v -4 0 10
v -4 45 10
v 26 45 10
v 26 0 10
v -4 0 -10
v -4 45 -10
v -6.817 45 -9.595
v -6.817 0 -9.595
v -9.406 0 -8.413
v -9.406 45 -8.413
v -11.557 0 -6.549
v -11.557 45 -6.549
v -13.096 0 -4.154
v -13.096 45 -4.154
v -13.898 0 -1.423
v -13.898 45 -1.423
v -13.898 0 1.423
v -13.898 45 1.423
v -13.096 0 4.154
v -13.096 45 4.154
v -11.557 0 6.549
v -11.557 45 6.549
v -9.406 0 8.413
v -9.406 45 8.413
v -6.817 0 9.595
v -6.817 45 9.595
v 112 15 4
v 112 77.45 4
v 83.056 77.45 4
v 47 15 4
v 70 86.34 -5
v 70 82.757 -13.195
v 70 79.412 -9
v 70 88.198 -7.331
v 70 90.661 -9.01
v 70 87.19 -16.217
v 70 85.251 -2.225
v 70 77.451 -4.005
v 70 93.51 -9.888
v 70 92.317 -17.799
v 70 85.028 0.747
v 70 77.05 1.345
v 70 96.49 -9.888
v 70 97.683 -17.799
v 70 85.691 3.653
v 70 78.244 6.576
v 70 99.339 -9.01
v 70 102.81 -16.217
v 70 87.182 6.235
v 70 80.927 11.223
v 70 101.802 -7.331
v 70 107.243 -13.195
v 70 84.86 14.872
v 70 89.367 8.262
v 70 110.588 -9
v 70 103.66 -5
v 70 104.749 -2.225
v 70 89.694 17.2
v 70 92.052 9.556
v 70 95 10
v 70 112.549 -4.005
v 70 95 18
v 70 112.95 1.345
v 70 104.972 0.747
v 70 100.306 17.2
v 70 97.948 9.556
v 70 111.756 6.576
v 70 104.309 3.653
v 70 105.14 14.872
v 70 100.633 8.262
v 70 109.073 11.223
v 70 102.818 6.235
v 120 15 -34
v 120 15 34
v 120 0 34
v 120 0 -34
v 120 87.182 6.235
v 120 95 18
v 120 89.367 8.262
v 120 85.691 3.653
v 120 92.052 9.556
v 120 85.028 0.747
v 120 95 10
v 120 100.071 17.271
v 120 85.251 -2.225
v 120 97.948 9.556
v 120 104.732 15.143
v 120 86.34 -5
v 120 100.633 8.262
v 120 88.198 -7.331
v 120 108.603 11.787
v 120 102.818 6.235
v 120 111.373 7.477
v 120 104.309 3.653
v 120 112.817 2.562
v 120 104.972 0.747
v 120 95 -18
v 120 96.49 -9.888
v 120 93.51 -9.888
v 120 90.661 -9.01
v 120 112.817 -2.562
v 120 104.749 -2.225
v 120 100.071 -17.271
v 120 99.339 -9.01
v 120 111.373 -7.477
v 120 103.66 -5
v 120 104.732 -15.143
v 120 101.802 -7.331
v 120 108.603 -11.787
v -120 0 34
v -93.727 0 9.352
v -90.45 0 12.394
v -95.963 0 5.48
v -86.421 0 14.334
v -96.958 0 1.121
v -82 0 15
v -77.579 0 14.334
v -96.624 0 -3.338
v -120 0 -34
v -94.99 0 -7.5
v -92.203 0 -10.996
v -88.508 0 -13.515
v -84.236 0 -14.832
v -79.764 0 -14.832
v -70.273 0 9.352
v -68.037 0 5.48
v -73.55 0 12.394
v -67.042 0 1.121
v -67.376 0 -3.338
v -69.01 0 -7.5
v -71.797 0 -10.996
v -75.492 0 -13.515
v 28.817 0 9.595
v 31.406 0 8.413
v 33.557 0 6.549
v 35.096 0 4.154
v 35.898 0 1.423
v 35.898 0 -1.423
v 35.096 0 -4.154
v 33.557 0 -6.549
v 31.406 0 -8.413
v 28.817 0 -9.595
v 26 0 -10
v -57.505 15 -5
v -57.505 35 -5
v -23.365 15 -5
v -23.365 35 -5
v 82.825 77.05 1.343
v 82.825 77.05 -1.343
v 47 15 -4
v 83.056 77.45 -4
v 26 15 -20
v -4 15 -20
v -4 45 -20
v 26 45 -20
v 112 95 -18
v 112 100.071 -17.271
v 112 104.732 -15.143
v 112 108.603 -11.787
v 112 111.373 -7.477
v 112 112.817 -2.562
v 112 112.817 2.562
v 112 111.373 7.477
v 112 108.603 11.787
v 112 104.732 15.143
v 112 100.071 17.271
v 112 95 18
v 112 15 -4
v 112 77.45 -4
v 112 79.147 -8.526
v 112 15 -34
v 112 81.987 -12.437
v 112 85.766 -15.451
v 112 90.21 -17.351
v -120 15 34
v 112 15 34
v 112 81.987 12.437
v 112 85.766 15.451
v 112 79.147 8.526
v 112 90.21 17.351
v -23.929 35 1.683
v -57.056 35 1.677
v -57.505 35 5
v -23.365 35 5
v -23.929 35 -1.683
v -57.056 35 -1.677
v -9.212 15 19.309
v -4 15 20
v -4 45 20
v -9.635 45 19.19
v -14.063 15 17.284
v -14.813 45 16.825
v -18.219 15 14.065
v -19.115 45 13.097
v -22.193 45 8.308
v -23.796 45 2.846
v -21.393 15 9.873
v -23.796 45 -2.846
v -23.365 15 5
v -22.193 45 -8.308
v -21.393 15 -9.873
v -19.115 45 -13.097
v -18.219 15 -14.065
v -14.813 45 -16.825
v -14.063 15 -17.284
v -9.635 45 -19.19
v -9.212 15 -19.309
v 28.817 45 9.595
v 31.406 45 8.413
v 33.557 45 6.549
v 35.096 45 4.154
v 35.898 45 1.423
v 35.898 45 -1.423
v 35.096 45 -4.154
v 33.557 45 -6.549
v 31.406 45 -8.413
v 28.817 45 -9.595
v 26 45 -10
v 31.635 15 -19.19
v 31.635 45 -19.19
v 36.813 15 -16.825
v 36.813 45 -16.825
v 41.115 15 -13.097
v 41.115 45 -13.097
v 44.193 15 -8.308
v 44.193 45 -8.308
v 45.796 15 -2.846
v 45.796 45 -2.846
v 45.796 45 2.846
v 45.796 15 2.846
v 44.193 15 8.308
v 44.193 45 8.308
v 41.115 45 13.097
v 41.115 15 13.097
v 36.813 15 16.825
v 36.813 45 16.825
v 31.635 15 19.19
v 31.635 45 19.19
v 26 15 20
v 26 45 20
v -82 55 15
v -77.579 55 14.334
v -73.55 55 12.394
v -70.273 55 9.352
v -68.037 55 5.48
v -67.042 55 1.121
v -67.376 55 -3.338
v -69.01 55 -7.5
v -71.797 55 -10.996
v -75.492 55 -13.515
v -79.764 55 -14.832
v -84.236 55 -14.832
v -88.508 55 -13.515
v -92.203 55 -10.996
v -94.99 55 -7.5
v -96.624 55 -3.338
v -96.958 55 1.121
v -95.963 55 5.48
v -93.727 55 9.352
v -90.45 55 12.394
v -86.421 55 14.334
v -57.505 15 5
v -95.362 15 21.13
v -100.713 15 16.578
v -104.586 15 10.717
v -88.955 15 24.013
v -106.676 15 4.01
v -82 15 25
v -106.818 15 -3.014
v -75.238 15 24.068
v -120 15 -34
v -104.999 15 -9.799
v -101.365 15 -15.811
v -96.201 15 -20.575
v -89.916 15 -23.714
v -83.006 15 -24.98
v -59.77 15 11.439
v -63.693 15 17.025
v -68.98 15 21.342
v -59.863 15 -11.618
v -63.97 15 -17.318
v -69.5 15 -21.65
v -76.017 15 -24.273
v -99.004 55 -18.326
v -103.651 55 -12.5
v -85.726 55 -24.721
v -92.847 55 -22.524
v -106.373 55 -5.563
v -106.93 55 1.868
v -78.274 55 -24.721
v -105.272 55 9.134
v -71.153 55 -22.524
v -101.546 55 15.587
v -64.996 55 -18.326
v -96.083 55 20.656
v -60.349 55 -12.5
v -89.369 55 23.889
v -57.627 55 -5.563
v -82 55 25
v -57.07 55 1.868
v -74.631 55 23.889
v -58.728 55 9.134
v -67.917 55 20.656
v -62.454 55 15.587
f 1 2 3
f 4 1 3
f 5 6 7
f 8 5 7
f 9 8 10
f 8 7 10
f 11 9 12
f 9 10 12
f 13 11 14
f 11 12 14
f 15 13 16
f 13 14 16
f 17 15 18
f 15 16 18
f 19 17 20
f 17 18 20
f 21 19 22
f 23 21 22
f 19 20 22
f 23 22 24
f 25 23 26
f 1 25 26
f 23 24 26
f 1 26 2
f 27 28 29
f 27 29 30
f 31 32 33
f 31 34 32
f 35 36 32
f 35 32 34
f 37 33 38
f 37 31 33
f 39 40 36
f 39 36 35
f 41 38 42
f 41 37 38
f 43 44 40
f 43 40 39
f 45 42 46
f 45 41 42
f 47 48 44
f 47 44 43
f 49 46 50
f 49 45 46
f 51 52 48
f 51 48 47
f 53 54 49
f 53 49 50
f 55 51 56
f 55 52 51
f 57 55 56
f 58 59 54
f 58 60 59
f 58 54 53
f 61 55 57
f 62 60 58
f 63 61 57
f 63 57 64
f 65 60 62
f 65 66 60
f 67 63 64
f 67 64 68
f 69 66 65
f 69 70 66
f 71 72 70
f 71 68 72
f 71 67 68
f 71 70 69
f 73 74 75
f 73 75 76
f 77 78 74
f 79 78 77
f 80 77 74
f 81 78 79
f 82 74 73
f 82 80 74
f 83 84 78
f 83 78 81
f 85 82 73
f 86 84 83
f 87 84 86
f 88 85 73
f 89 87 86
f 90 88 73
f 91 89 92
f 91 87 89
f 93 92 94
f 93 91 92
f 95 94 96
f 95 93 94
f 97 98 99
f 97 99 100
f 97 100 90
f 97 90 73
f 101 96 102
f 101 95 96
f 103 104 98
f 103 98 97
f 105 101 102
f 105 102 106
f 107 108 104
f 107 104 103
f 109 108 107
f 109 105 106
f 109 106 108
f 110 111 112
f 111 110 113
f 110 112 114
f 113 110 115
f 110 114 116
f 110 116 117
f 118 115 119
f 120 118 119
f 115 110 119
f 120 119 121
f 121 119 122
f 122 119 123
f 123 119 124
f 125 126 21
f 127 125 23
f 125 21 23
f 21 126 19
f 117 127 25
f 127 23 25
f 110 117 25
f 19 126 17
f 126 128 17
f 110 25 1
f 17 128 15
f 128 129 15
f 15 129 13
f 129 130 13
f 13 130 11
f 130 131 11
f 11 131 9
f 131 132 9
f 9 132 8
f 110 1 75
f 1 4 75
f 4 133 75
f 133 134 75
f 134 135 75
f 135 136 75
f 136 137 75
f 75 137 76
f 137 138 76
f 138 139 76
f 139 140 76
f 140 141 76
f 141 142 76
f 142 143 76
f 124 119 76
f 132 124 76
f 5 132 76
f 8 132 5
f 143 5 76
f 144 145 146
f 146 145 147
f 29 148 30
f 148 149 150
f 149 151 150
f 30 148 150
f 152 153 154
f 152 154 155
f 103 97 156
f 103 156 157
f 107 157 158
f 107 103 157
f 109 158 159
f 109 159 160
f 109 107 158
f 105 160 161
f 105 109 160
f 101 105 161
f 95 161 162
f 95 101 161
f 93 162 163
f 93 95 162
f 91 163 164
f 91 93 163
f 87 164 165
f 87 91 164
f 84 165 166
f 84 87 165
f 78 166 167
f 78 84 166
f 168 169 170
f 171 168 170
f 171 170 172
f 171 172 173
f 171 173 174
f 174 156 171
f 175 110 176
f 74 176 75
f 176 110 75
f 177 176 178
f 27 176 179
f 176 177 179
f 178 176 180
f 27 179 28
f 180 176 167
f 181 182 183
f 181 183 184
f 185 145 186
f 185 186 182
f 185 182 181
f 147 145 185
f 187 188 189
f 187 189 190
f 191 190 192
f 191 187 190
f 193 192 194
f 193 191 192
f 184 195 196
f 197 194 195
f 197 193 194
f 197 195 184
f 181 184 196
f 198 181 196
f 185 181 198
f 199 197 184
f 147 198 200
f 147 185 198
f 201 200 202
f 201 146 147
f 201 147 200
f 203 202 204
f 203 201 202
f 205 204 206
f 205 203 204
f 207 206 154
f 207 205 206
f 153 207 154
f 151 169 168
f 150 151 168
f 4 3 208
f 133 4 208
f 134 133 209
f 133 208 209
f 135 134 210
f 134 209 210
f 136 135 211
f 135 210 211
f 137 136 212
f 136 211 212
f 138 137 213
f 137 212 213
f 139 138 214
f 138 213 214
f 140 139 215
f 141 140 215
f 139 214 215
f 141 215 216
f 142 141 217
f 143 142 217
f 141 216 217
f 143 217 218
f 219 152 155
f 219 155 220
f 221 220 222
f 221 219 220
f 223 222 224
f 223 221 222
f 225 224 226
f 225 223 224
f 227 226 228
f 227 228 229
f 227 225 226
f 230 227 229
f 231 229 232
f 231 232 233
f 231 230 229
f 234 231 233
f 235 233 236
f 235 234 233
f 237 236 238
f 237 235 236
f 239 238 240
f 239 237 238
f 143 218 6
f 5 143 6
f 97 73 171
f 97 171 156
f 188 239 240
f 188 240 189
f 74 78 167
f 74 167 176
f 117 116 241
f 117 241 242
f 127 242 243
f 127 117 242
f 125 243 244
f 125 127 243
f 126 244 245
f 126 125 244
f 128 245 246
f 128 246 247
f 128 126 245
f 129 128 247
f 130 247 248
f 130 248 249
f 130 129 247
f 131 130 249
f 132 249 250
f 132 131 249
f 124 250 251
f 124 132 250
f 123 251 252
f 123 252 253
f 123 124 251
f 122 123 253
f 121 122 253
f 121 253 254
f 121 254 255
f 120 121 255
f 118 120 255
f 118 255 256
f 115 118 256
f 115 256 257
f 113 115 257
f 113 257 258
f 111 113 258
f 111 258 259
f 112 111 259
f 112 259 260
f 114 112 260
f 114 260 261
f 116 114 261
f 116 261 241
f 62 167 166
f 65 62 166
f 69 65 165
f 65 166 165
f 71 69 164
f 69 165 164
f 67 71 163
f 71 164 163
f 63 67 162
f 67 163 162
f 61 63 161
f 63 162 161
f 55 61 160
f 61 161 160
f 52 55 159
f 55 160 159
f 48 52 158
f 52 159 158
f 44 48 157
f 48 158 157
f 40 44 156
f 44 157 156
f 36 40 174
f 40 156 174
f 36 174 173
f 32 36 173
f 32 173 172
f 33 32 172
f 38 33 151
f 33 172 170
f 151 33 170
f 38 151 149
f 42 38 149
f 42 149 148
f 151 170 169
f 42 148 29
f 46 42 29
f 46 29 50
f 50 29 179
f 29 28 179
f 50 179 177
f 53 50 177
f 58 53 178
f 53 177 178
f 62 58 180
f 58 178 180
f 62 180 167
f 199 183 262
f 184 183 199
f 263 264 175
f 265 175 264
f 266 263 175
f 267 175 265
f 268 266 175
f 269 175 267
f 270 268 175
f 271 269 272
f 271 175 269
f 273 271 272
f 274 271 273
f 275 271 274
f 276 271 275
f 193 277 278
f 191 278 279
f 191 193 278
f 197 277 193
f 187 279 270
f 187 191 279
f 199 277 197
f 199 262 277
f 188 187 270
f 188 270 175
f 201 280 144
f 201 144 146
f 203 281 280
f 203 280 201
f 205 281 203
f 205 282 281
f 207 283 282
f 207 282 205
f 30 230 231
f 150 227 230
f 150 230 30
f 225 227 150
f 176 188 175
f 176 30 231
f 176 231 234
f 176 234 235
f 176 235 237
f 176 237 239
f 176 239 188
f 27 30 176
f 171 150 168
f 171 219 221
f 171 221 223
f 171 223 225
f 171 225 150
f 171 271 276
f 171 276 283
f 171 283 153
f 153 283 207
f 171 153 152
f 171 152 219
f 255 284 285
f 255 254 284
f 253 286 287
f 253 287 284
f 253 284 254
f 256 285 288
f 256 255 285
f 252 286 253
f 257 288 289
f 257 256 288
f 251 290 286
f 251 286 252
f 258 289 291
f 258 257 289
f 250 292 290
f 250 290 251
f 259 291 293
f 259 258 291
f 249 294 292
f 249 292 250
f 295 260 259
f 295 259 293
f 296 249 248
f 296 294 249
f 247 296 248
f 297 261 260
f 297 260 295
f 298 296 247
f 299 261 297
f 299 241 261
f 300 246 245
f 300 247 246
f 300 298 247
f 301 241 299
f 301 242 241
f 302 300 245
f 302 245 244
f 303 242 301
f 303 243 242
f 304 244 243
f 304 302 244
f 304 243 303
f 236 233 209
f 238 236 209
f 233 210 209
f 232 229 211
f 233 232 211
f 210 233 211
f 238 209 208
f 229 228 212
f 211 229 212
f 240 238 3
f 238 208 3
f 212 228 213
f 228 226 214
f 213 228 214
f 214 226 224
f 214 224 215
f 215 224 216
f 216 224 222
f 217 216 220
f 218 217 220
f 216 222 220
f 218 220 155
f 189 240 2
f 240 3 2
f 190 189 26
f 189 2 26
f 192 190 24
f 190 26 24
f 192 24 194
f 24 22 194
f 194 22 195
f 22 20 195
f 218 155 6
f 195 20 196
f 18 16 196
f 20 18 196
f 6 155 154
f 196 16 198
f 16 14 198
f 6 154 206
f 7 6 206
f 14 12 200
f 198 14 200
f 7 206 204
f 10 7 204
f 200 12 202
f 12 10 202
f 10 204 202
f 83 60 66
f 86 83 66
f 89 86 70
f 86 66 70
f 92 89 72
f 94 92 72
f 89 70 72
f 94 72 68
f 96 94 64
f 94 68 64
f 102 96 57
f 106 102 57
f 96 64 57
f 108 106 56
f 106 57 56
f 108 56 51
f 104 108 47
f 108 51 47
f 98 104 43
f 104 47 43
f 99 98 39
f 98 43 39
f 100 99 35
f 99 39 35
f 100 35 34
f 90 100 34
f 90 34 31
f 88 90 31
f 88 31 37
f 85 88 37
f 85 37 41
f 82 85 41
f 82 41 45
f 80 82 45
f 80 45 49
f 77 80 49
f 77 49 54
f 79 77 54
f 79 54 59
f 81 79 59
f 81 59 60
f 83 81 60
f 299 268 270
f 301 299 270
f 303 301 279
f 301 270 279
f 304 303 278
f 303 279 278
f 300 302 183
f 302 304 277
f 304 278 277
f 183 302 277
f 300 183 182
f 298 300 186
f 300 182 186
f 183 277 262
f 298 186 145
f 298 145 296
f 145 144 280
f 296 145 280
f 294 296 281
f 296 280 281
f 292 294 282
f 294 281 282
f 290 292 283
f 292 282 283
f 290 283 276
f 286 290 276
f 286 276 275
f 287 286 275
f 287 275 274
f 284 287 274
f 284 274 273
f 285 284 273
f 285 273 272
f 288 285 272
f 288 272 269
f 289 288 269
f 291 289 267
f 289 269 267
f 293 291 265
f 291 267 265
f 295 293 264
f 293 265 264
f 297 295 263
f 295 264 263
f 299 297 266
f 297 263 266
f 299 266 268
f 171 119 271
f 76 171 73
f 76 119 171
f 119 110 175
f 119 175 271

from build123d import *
from build123d.topology import SkipClean

# Parameters (mm, degrees)
SKETCH2_W           = 240
SKETCH2_H           = 68
BOSS_EXTRUDE1_DEPTH = 15
SKETCH4_R           = 25
SKETCH4_R_2         = 15
BOSS_EXTRUDE4_DEPTH = 40
CUT_EXTRUDE2_START  = -40
SKETCH7_R           = 15
CUT_EXTRUDE2_DEPTH  = 40
BOSS_EXTRUDE5_DEPTH = 30
CUT_EXTRUDE3_DEPTH  = 77
RIB3_REACH          = 138.312
SKETCH11_WALL_W     = 307.624283584
SKETCH11_WALL_H     = 10
BOSS_EXTRUDE6_DEPTH = 8
SKETCH13_R          = 18
BOSS_EXTRUDE7_DEPTH = 42
SKETCH14_R          = 10
CUT_EXTRUDE4_DEPTH  = 67
RIB14_REACH         = 170.3
SKETCH19_WALL_W     = 410.192086974
SKETCH19_WALL_H     = 8


with BuildPart() as part:
    # Sketch2 → Boss-Extrude1 (new body)
    with BuildSketch(Plane(origin=(0, 0, 0), x_dir=(1, 0, 0), z_dir=(0, 1, 0))):
        Rectangle(SKETCH2_W, SKETCH2_H)
    extrude(amount=BOSS_EXTRUDE1_DEPTH)

    # Sketch4 → Boss-Extrude4 (add)
    with BuildSketch(Plane(origin=(0, 15, 0), x_dir=(1, 0, 0), z_dir=(0, 1, 0))):
        with Locations((-82, 0)):
            Circle(SKETCH4_R)
        with Locations((-82, 0)):
            Circle(SKETCH4_R_2, mode=Mode.SUBTRACT)
    extrude(amount=BOSS_EXTRUDE4_DEPTH)

    # Sketch7 → Cut-Extrude2 (cut)
    with BuildSketch(Plane(origin=(0, 15, 0), x_dir=(1, 0, 0), z_dir=(0, 1, 0)).offset(CUT_EXTRUDE2_START)):
        with Locations((-82, 0)):
            Circle(SKETCH7_R)
    extrude(amount=CUT_EXTRUDE2_DEPTH, mode=Mode.SUBTRACT)

    # Sketch8 → Boss-Extrude5 (add)
    with BuildSketch(Plane(origin=(0, 15, 0), x_dir=(1, 0, 0), z_dir=(0, 1, 0))):
        with BuildLine():
            Line((-4, 20), (26, 20))
            ThreePointArc((26, 20), (46, 0), (26, -20))
            Line((26, -20), (-4, -20))
            ThreePointArc((-4, -20), (-24, 0), (-4, 20))
        make_face()
    extrude(amount=BOSS_EXTRUDE5_DEPTH)

    # Sketch9 → Cut-Extrude3 (cut)
    with BuildSketch(Plane(origin=(0, 45, 0), x_dir=(1, 0, 0), z_dir=(0, 1, 0))):
        with BuildLine():
            Line((-4, -10), (26, -10))
            ThreePointArc((26, -10), (36, 0), (26, 10))
            Line((26, 10), (-4, 10))
            ThreePointArc((-4, 10), (-14, 0), (-4, -10))
        make_face()
    extrude(amount=-CUT_EXTRUDE3_DEPTH, mode=Mode.SUBTRACT)

    # Sketch11 wall → Rib3 (add, up to next)
    with BuildSketch(Plane(origin=(-40.5, 35, 0), x_dir=(1, 0, 0), z_dir=(0, 1, 0)), mode=Mode.PRIVATE) as rib3_sk1:
        Rectangle(SKETCH11_WALL_W, SKETCH11_WALL_H)
    rib3_tool1 = extrude(rib3_sk1.sketch, amount=-RIB3_REACH, mode=Mode.PRIVATE) - part.part
    add(rib3_tool1.solids().sort_by_distance((-40.5, 35, 0))[0])

    # Sketch12 → Boss-Extrude6 (add)
    with BuildSketch(Plane(origin=(120, 0, 0), x_dir=(0, 0, -1), z_dir=(1, 0, 0))):
        with BuildLine():
            Line((-18, 95), (-34, 15))
            Line((-34, 15), (34, 15))
            Line((34, 15), (18, 95))
            ThreePointArc((18, 95), (0, 113), (-18, 95))
        make_face()
    extrude(amount=-BOSS_EXTRUDE6_DEPTH)

    # Sketch13 → Boss-Extrude7 (add)
    with SkipClean():  # the faces are left unmerged after this step: merging them gives an invalid solid
        with BuildSketch(Plane.ZY.offset(-112)):
            with Locations((0, 95)):
                Circle(SKETCH13_R)
        extrude(amount=BOSS_EXTRUDE7_DEPTH)
    add(part.part.scale(1), mode=Mode.REPLACE)  # the faces are merged on a copy

    # Sketch14 → Cut-Extrude4 (cut)
    with BuildSketch(Plane.ZY.offset(-70)):
        with Locations((0, 95)):
            Circle(SKETCH14_R)
    extrude(amount=-CUT_EXTRUDE4_DEPTH, mode=Mode.SUBTRACT)

    # Sketch19 wall → Rib14 (add, up to next)
    with BuildSketch(Plane(origin=(64.897858345, 46, 0), x_dir=(-0.500000000003, -0.866025403783, 0), z_dir=(0.866025403783, -0.500000000003, 0)), mode=Mode.PRIVATE) as rib14_sk1:
        Rectangle(SKETCH19_WALL_W, SKETCH19_WALL_H)
    rib14_tool1 = extrude(rib14_sk1.sketch, amount=RIB14_REACH, mode=Mode.PRIVATE) - part.part
    add(rib14_tool1.solids().sort_by_distance((64.897858345, 46, 0))[0])


solid = part.part
